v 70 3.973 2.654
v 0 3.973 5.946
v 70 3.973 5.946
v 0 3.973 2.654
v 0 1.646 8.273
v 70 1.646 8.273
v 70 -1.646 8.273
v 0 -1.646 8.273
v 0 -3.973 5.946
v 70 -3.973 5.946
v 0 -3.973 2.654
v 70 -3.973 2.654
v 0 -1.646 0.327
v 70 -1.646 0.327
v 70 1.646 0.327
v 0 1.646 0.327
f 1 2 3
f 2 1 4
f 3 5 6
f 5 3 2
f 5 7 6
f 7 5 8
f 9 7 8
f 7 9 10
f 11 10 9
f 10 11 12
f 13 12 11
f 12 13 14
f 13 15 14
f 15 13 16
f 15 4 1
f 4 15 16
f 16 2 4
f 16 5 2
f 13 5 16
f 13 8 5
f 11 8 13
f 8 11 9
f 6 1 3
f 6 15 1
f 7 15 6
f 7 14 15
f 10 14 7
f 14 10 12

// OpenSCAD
holeSizeDiff = 1;

module connector(length,size,isHole=false) {
    change = isHole? holeSizeDiff : 0;
    radius = (size/2 + change);

    translate(v=[0,0,size/2])
    rotate(a=[90, 22.5, 90])
    cylinder(h=length, r=radius, $fn=8);
    echo("radius"); echo(radius);
}

// connector(50, 10, 0);

module connectorBase () {
    cube([50, 50, 5]);


    module connectorCutout () {
        translate(v=[0,-5,0]) 
        rotate([0,45,0])
        cube([25, 60, 25]);
    }

    difference() {
        cube([35, 50, 15]);
        translate([20,0,20]) 
        connectorCutout();
    }
}

module connectorHoles () {
    translate(v=[0, 15, 6]) 
    connector(length=35, size=7, isHole=true);
    
    translate(v=[0, 35, 6]) 
    connector(length=35, size=7, isHole=true);
}

// difference() {
//     connectorBase();
//     connectorHoles();
// }

connector(length=70, size=8.6, isHole=false);
